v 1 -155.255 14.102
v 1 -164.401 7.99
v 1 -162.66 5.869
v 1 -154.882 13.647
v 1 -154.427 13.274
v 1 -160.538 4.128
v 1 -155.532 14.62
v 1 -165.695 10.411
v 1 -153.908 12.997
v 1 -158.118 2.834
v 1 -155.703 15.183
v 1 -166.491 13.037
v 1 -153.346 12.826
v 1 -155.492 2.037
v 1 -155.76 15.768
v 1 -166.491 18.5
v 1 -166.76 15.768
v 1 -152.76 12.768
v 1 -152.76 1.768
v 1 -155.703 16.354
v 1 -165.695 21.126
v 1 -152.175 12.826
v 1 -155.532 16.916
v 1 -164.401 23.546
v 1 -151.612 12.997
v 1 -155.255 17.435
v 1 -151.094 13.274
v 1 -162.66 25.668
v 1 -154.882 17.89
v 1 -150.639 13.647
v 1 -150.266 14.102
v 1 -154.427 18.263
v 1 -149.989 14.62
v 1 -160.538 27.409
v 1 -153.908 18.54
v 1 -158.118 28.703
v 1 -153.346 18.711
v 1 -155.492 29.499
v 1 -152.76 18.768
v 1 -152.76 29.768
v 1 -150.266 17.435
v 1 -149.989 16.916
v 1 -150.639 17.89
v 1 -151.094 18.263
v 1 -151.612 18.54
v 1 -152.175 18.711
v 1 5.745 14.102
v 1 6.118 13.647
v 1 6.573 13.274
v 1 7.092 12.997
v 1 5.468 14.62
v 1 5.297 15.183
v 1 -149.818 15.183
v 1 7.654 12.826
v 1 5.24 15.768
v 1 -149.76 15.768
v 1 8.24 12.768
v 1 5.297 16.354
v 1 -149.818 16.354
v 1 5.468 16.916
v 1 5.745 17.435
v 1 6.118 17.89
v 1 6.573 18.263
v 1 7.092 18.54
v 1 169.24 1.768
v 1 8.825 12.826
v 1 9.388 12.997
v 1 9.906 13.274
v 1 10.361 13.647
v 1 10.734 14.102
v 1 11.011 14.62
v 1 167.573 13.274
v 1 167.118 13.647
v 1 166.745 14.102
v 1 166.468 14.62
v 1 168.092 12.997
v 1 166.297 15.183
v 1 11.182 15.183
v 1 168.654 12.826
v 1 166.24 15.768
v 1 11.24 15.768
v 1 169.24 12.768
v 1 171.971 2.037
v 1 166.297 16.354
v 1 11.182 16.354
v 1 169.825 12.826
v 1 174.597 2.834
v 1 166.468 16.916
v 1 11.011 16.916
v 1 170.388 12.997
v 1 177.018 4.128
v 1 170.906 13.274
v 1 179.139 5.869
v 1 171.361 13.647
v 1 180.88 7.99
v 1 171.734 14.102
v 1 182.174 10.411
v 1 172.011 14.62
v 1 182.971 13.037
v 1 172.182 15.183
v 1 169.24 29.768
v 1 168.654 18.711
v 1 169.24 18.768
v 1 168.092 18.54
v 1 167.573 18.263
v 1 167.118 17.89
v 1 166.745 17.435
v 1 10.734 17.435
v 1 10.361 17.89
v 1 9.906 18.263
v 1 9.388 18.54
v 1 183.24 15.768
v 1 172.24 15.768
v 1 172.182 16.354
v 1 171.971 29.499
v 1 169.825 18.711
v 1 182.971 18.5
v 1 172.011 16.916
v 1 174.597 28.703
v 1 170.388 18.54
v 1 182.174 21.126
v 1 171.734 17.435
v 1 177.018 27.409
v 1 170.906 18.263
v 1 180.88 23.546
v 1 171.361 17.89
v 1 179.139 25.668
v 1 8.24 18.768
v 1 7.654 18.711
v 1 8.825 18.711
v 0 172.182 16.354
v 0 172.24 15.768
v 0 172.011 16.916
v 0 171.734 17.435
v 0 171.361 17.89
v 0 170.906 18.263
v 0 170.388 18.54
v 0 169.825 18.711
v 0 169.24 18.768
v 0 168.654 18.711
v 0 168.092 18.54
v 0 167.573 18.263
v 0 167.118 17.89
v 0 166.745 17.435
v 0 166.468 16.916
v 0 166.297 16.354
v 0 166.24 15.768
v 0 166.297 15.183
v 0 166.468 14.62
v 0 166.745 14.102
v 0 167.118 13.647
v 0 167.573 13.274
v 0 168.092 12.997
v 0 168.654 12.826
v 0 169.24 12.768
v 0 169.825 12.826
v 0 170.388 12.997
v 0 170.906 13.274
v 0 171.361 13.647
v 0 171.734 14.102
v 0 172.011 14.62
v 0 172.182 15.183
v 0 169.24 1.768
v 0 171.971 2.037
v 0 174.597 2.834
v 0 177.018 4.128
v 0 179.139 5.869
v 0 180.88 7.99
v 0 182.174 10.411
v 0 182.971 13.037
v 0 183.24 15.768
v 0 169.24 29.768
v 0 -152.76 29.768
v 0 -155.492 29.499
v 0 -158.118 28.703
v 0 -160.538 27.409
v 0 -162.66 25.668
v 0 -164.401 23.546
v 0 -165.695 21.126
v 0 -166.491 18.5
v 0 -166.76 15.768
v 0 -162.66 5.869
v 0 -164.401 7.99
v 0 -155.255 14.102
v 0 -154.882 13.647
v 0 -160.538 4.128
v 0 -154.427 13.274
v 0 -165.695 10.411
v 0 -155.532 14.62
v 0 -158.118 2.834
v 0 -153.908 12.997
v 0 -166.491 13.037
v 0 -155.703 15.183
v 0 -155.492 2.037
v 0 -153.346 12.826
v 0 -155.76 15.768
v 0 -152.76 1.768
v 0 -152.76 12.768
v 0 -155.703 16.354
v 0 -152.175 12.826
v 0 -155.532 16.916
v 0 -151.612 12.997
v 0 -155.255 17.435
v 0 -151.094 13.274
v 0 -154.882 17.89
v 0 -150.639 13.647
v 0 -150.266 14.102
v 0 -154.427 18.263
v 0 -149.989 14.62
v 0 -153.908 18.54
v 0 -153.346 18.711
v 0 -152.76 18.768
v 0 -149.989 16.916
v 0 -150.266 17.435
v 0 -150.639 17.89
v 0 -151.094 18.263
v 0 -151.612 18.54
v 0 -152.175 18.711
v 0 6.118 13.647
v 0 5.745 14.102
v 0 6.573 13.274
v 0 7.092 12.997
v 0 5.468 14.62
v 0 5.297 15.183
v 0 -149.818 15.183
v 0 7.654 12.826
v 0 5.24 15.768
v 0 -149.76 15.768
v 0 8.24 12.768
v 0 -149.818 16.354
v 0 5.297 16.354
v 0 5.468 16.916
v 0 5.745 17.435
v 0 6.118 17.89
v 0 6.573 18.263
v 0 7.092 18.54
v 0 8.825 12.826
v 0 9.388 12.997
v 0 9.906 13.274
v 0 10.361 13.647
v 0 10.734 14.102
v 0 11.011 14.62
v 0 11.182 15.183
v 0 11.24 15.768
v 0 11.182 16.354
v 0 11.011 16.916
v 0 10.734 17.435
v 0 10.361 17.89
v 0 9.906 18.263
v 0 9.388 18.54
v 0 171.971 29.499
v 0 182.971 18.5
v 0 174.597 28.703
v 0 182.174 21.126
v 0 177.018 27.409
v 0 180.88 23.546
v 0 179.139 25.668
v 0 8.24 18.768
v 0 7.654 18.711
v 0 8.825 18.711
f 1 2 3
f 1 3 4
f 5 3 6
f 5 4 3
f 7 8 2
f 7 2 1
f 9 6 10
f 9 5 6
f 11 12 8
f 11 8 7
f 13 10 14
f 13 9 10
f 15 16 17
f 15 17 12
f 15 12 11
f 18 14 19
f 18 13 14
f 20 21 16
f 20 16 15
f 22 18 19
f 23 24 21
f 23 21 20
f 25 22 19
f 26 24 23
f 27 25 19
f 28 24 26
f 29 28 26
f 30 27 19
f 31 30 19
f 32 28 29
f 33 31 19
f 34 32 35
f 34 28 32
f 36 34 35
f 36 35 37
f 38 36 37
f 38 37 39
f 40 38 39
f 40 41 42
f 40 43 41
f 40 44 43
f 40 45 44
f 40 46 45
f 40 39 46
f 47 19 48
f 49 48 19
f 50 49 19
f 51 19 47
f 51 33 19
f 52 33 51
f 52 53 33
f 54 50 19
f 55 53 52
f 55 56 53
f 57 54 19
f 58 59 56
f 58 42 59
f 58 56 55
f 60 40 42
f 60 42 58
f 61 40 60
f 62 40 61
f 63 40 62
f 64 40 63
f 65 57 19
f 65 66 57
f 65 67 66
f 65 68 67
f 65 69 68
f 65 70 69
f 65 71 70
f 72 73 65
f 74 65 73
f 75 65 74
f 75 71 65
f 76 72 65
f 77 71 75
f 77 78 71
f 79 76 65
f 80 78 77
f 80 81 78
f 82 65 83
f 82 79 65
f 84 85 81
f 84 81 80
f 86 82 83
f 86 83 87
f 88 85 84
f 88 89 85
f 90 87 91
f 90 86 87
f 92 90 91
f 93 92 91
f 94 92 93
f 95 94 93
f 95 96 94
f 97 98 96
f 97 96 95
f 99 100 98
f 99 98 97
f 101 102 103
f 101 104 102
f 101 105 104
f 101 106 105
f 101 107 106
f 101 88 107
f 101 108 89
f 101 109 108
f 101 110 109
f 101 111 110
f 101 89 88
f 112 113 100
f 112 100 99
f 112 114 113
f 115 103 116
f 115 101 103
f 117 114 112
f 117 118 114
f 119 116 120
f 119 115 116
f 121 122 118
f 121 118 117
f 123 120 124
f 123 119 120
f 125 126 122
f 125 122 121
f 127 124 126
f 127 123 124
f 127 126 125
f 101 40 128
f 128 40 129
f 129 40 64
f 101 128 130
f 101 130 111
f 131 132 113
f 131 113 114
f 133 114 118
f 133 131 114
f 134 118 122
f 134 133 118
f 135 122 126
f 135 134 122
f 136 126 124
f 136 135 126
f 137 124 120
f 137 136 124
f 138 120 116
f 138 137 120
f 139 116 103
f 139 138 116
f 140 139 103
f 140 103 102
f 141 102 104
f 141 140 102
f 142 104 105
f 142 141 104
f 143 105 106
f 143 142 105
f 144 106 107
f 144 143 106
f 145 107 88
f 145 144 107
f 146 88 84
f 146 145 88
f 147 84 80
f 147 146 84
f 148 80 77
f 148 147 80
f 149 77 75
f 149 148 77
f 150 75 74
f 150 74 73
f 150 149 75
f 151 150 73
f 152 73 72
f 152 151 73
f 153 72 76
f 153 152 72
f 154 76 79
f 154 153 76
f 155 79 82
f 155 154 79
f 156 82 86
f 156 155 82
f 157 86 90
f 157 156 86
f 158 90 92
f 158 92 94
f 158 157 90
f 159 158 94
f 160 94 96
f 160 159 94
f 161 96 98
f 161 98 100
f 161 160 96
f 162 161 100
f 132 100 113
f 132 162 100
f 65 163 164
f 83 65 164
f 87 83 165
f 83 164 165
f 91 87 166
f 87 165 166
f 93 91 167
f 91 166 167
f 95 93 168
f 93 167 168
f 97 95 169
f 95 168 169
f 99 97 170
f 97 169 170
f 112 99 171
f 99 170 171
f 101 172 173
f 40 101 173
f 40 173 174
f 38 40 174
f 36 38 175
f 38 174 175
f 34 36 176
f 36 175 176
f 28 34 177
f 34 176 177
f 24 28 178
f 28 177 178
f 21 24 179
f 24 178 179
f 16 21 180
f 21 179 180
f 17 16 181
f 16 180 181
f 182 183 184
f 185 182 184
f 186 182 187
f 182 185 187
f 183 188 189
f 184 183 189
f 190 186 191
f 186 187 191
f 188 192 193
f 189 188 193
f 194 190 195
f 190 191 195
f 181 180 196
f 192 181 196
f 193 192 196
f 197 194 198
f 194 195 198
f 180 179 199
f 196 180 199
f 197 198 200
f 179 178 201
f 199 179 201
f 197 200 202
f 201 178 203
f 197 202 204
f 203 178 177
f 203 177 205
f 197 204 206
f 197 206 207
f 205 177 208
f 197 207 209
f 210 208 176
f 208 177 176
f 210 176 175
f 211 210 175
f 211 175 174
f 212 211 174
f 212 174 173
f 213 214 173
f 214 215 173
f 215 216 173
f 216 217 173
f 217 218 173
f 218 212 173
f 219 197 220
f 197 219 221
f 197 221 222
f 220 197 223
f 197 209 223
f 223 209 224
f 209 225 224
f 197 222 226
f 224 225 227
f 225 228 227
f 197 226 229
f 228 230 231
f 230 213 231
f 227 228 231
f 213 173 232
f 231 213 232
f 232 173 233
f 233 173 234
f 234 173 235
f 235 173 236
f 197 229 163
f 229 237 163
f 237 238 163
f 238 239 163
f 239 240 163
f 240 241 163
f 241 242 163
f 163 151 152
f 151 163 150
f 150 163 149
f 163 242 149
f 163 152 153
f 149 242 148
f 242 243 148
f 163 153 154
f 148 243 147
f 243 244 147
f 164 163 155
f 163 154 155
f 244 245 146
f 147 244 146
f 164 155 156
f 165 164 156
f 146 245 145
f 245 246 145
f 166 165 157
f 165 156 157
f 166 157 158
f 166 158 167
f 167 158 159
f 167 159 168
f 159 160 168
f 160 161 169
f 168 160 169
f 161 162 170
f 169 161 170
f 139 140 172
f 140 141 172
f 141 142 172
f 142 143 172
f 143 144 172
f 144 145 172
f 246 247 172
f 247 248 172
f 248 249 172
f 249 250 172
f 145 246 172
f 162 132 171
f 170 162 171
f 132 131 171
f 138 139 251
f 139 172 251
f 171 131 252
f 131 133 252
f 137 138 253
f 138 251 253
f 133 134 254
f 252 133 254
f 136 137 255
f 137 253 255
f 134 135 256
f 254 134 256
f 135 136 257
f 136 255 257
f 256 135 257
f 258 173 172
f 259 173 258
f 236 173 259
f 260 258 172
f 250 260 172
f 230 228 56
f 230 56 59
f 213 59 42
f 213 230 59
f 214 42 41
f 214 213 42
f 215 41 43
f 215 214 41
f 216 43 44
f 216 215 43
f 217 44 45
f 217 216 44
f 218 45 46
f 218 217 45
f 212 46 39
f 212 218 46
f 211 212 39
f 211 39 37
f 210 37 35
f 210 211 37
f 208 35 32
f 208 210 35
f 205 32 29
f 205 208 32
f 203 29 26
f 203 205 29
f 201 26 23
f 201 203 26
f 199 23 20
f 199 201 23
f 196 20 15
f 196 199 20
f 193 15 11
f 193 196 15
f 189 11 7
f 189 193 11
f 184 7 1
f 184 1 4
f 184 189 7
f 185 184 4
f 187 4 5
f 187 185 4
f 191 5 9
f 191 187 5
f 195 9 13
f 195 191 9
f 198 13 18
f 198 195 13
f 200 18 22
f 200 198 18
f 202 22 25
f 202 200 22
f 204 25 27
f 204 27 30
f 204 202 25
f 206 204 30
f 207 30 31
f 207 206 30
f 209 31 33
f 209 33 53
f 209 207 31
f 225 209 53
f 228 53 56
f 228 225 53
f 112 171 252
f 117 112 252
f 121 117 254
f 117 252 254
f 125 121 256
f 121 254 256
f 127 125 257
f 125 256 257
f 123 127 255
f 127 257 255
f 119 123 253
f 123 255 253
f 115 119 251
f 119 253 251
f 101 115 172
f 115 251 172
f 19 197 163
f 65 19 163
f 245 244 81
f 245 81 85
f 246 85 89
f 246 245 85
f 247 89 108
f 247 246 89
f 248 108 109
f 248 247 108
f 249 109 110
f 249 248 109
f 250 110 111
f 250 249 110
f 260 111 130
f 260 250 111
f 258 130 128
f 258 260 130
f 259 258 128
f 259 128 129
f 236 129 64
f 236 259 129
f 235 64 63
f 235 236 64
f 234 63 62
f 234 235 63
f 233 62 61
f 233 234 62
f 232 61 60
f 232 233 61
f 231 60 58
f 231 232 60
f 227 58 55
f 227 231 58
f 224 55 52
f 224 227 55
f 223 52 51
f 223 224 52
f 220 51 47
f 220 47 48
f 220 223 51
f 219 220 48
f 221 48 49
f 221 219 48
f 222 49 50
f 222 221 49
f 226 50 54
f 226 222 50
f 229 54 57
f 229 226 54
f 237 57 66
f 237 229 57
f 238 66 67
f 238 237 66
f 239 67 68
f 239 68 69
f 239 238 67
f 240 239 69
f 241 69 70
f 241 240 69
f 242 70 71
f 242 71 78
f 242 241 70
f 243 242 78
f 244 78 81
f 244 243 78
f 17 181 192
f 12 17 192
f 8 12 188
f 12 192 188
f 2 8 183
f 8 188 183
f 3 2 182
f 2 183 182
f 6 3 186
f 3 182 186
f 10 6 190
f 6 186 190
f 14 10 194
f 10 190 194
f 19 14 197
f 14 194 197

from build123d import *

# Parameters (mm, degrees)
F0_R     = 3
F1_DEPTH = 1


with BuildPart() as f1:
    # F0 (on Right) → F1 (new body)
    with BuildSketch(Plane.YZ):
        with BuildLine():
            Line((169.2397592919, 29.7682959138), (-152.7602405548, 29.7682959138))
            ThreePointArc((-152.7602405548, 29.7682959138), (-142.8607456182, 25.6677908504), (-138.7602405548, 15.7682959138))
            ThreePointArc((-138.7602405548, 15.7682959138), (-142.8607456182, 5.8688009772), (-152.7602405548, 1.7682959138))
            Line((-152.7602405548, 1.7682959138), (169.2397594136, 1.7682959138))
            ThreePointArc((169.2397594136, 1.7682959138), (155.2397594452, 15.7682958529), (169.2397592919, 29.7682959138))
        make_face()
        with Locations((8.2397594452, 15.7682959138)):
            Circle(F0_R, mode=Mode.SUBTRACT)
        with BuildLine():
            ThreePointArc((-138.7602405548, 15.7682959138), (-142.8607456182, 25.6677908504), (-152.7602405548, 29.7682959138))
            ThreePointArc((-152.7602405548, 29.7682959138), (-162.6597354914, 25.6677908504), (-166.7602405548, 15.7682959138))
            ThreePointArc((-166.7602405548, 15.7682959138), (-162.6597354914, 5.8688009772), (-152.7602405548, 1.7682959138))
            ThreePointArc((-152.7602405548, 1.7682959138), (-142.8607456182, 5.8688009772), (-138.7602405548, 15.7682959138))
        make_face()
        with Locations((-152.7602405548, 15.7682959138)):
            Circle(F0_R, mode=Mode.SUBTRACT)
        with BuildLine():
            ThreePointArc((183.2397594452, 15.7682959138), (179.1392543276, 25.6677909046), (169.2397592919, 29.7682959138))
            ThreePointArc((169.2397592919, 29.7682959138), (155.2397594452, 15.7682958529), (169.2397594136, 1.7682959138))
            ThreePointArc((169.2397594136, 1.7682959138), (179.1392543706, 5.868800966), (183.2397594452, 15.7682959138))
        make_face()
        with Locations((169.2397594452, 15.7682959138)):
            Circle(F0_R, mode=Mode.SUBTRACT)
    extrude(amount=F1_DEPTH)


solid = f1.part
